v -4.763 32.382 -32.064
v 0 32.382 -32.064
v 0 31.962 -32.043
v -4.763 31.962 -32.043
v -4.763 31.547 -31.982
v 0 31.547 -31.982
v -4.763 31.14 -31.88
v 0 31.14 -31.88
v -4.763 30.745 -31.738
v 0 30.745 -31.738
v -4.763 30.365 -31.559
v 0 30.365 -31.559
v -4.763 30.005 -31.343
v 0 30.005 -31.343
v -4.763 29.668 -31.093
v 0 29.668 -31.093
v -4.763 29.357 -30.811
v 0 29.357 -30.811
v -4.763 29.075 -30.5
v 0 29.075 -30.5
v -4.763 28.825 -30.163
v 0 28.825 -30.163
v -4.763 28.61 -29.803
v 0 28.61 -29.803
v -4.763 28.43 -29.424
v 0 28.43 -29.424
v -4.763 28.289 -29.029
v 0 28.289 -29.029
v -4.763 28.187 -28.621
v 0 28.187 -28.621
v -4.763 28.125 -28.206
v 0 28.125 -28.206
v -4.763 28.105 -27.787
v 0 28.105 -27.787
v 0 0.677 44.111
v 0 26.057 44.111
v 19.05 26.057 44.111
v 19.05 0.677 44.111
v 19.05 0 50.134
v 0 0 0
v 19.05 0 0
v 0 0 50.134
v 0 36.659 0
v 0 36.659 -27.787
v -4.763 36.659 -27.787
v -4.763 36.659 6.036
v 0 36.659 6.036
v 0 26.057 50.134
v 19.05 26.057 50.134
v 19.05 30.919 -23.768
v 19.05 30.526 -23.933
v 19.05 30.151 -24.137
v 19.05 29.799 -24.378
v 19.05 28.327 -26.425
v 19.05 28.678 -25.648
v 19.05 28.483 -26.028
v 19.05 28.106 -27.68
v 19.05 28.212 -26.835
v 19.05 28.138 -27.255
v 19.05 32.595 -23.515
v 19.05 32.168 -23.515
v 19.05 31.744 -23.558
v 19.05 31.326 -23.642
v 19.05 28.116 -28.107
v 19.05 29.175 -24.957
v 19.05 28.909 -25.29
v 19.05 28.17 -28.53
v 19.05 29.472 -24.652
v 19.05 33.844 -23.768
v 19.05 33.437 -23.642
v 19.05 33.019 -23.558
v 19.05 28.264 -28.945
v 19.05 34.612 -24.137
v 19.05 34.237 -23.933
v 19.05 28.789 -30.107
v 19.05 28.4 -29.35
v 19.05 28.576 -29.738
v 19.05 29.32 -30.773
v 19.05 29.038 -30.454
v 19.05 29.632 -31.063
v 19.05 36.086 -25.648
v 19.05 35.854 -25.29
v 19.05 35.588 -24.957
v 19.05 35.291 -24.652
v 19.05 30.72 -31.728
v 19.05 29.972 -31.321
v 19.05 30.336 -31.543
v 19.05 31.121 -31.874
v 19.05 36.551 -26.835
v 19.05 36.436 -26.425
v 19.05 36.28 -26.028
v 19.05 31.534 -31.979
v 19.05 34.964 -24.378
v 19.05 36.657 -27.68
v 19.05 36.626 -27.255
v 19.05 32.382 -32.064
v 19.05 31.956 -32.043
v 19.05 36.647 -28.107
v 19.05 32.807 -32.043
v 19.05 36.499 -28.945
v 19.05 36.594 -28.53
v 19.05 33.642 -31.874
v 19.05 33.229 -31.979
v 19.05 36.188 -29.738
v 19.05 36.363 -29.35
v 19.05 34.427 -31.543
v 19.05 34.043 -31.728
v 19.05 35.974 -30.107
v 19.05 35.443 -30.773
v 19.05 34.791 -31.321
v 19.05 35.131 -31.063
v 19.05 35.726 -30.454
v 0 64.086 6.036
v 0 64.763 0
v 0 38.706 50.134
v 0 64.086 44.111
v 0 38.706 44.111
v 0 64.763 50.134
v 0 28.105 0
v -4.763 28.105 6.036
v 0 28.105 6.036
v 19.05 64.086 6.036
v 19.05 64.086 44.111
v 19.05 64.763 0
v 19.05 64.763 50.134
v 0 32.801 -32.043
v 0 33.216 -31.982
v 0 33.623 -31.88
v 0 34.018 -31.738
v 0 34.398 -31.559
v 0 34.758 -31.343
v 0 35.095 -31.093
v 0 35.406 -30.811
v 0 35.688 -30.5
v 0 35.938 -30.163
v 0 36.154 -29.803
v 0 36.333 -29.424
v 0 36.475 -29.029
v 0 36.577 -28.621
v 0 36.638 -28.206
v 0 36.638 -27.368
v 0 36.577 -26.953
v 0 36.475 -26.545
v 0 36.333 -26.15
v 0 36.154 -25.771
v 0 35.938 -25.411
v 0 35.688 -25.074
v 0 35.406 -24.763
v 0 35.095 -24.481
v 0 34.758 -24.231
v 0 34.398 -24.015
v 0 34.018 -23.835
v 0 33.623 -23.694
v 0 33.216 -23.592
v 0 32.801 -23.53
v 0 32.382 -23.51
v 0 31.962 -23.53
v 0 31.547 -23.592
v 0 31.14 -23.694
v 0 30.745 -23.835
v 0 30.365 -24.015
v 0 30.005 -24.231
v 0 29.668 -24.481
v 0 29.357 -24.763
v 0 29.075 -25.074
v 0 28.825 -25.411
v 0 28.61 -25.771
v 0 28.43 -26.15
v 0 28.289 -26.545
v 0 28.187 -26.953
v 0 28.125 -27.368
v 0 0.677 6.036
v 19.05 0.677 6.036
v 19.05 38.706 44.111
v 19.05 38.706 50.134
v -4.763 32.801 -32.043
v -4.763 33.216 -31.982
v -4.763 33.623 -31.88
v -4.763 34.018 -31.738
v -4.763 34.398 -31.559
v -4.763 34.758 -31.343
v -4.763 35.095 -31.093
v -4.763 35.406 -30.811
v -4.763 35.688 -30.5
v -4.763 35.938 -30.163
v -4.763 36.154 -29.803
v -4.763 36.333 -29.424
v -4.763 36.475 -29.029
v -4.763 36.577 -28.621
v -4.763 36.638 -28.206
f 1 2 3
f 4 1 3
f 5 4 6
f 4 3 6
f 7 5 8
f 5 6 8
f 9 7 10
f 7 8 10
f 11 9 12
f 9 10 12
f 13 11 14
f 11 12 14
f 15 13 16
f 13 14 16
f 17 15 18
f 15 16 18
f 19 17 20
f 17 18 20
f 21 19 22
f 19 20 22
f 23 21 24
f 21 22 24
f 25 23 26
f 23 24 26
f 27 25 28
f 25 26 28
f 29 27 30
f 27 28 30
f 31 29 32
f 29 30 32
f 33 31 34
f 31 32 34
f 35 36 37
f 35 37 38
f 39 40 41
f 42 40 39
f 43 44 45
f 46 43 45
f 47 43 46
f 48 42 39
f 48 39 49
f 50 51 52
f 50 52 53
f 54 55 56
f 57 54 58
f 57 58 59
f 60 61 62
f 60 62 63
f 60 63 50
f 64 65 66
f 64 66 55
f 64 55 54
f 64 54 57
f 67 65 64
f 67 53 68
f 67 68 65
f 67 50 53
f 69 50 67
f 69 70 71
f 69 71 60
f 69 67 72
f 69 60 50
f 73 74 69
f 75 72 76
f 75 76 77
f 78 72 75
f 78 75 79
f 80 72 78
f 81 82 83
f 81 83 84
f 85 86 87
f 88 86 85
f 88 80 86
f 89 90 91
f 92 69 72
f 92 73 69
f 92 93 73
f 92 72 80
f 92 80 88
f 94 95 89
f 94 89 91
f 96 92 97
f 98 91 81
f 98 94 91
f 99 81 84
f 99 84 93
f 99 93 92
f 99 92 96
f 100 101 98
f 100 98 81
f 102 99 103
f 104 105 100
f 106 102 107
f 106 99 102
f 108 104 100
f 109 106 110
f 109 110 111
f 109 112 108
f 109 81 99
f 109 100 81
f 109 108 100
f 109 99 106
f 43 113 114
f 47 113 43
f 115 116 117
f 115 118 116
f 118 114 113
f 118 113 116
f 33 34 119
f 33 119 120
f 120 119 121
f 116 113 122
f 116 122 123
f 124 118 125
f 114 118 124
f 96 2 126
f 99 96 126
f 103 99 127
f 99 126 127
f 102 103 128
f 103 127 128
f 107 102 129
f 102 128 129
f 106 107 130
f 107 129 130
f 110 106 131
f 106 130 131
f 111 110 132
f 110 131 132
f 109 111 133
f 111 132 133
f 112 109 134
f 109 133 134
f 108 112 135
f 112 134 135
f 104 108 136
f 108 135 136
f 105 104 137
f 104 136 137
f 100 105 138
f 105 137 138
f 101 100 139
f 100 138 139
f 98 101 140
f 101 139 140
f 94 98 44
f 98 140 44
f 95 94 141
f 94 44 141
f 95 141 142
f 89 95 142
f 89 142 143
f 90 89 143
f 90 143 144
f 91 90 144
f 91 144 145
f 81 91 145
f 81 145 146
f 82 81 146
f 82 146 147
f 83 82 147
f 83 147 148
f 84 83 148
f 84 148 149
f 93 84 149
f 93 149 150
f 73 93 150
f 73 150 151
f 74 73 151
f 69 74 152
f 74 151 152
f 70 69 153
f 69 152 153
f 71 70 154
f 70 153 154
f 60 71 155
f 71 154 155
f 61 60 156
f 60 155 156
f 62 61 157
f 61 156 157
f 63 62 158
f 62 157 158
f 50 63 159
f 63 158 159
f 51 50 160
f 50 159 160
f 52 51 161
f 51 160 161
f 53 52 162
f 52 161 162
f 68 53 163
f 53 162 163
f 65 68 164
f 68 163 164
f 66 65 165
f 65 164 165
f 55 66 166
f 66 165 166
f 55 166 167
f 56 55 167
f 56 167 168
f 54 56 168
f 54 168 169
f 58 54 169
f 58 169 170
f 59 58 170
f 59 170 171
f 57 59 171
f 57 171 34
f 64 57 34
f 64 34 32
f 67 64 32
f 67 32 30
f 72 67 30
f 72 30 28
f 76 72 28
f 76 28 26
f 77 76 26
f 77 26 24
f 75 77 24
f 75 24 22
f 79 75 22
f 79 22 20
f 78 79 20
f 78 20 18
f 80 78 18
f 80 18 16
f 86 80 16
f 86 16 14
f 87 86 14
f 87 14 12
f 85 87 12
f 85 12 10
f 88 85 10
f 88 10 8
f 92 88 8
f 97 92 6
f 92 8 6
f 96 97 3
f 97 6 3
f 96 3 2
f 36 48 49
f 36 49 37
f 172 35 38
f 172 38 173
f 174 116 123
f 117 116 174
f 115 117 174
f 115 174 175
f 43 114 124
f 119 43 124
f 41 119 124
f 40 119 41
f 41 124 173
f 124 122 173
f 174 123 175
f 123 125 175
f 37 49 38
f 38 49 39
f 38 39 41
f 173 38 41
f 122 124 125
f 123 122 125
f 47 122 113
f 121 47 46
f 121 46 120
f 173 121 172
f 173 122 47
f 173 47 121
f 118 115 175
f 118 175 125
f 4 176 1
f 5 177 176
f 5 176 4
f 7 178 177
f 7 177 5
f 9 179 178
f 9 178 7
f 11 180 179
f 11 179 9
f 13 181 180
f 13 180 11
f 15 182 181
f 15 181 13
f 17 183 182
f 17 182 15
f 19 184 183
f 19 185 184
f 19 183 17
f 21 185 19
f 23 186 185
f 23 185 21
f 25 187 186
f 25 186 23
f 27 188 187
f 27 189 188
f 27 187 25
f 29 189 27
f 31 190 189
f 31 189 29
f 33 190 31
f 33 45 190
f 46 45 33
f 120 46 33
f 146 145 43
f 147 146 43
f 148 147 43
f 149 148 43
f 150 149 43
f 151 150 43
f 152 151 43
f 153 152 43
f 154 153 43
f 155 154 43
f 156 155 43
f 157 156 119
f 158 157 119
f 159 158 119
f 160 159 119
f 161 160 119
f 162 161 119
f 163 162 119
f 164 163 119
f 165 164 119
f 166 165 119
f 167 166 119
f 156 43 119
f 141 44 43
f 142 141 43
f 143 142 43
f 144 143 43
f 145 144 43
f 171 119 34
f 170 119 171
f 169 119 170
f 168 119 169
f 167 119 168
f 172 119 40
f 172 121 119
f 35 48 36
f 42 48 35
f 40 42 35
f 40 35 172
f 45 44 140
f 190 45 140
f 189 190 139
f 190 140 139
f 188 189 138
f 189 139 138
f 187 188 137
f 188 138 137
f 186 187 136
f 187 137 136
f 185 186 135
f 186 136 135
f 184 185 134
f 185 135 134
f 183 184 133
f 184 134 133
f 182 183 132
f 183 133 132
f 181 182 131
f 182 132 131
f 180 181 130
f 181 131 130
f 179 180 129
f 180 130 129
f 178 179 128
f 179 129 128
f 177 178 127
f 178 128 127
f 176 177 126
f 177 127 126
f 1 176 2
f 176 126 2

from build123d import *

# Parameters (mm, degrees)
BOSS_EXTRUDE1_DEPTH = 19.05
SKETCH2_W           = 8.554162714
SKETCH2_H           = 38.1
BOSS_EXTRUDE2_DEPTH = 4.763405733
SKETCH3_R           = 4.277081357
BOSS_EXTRUDE3_DEPTH = 19.05
CUT_EXTRUDE1_REACH  = 86.087
CUT_EXTRUDE2_REACH  = 86.087


with BuildPart() as part:
    # Sketch1 → Boss-Extrude1 (new body)
    with BuildSketch(Plane.YZ):
        Polygon((0, 0), (0, 50.133536148), (26.05701333, 50.133536148), (26.05701333, 44.11057508), (0.67733333, 44.11057508), (0.67733333, 6.03597508), (64.08589333, 6.03597508), (64.08589333, 44.11057508), (38.70621333, 44.11057508), (38.70621333, 50.133536148), (64.76322666, 50.133536148), (64.76322666, 0), align=None)
    extrude(amount=BOSS_EXTRUDE1_DEPTH)

    # Sketch2 → Boss-Extrude2 (add)
    with BuildSketch(Plane(origin=(0, 0, 0), x_dir=(0, -1, 0), z_dir=(-1, 0, 0))):
        with Locations((-32.38161333, -13.01402492)):
            Rectangle(SKETCH2_W, SKETCH2_H)
    extrude(amount=BOSS_EXTRUDE2_DEPTH)

    # Sketch3 → Boss-Extrude3 (add)
    with BuildSketch(Plane.YZ):
        with Locations(Location((32.38161333, -27.786943563, 0), (0, 0, 270))):
            Circle(SKETCH3_R)
    extrude(amount=BOSS_EXTRUDE3_DEPTH)

    # Sketch5 → Cut-Extrude1 (cut, up to next)
    with BuildSketch(Plane.YZ, mode=Mode.PRIVATE) as cut_extrude1_sk1:
        with BuildLine():
            Line((32.38161333, -32.06402492), (36.658694687, -32.06402492))
            Line((36.658694687, -32.06402492), (36.658694687, -27.786943563))
            ThreePointArc((36.658694687, -27.786943563), (35.405966561, -30.811296794), (32.38161333, -32.06402492))
        make_face()
    cut_extrude1_tool1 = extrude(cut_extrude1_sk1.sketch, amount=-CUT_EXTRUDE1_REACH, mode=Mode.PRIVATE) & part.part
    add(cut_extrude1_tool1.solids().sort_by_distance((0, 35.703332, -31.108662))[0], mode=Mode.SUBTRACT)

    # Sketch6 → Cut-Extrude2 (cut, up to next)
    with BuildSketch(Plane.YZ, mode=Mode.PRIVATE) as cut_extrude2_sk1:
        with BuildLine():
            Line((28.104531973, -27.786943563), (28.104531973, -32.06402492))
            Line((28.104531973, -32.06402492), (32.38161333, -32.06402492))
            ThreePointArc((32.38161333, -32.06402492), (29.357260099, -30.811296794), (28.104531973, -27.786943563))
        make_face()
    cut_extrude2_tool1 = extrude(cut_extrude2_sk1.sketch, amount=-CUT_EXTRUDE2_REACH, mode=Mode.PRIVATE) & part.part
    add(cut_extrude2_tool1.solids().sort_by_distance((0, 29.059895, -31.108662))[0], mode=Mode.SUBTRACT)


solid = part.part
